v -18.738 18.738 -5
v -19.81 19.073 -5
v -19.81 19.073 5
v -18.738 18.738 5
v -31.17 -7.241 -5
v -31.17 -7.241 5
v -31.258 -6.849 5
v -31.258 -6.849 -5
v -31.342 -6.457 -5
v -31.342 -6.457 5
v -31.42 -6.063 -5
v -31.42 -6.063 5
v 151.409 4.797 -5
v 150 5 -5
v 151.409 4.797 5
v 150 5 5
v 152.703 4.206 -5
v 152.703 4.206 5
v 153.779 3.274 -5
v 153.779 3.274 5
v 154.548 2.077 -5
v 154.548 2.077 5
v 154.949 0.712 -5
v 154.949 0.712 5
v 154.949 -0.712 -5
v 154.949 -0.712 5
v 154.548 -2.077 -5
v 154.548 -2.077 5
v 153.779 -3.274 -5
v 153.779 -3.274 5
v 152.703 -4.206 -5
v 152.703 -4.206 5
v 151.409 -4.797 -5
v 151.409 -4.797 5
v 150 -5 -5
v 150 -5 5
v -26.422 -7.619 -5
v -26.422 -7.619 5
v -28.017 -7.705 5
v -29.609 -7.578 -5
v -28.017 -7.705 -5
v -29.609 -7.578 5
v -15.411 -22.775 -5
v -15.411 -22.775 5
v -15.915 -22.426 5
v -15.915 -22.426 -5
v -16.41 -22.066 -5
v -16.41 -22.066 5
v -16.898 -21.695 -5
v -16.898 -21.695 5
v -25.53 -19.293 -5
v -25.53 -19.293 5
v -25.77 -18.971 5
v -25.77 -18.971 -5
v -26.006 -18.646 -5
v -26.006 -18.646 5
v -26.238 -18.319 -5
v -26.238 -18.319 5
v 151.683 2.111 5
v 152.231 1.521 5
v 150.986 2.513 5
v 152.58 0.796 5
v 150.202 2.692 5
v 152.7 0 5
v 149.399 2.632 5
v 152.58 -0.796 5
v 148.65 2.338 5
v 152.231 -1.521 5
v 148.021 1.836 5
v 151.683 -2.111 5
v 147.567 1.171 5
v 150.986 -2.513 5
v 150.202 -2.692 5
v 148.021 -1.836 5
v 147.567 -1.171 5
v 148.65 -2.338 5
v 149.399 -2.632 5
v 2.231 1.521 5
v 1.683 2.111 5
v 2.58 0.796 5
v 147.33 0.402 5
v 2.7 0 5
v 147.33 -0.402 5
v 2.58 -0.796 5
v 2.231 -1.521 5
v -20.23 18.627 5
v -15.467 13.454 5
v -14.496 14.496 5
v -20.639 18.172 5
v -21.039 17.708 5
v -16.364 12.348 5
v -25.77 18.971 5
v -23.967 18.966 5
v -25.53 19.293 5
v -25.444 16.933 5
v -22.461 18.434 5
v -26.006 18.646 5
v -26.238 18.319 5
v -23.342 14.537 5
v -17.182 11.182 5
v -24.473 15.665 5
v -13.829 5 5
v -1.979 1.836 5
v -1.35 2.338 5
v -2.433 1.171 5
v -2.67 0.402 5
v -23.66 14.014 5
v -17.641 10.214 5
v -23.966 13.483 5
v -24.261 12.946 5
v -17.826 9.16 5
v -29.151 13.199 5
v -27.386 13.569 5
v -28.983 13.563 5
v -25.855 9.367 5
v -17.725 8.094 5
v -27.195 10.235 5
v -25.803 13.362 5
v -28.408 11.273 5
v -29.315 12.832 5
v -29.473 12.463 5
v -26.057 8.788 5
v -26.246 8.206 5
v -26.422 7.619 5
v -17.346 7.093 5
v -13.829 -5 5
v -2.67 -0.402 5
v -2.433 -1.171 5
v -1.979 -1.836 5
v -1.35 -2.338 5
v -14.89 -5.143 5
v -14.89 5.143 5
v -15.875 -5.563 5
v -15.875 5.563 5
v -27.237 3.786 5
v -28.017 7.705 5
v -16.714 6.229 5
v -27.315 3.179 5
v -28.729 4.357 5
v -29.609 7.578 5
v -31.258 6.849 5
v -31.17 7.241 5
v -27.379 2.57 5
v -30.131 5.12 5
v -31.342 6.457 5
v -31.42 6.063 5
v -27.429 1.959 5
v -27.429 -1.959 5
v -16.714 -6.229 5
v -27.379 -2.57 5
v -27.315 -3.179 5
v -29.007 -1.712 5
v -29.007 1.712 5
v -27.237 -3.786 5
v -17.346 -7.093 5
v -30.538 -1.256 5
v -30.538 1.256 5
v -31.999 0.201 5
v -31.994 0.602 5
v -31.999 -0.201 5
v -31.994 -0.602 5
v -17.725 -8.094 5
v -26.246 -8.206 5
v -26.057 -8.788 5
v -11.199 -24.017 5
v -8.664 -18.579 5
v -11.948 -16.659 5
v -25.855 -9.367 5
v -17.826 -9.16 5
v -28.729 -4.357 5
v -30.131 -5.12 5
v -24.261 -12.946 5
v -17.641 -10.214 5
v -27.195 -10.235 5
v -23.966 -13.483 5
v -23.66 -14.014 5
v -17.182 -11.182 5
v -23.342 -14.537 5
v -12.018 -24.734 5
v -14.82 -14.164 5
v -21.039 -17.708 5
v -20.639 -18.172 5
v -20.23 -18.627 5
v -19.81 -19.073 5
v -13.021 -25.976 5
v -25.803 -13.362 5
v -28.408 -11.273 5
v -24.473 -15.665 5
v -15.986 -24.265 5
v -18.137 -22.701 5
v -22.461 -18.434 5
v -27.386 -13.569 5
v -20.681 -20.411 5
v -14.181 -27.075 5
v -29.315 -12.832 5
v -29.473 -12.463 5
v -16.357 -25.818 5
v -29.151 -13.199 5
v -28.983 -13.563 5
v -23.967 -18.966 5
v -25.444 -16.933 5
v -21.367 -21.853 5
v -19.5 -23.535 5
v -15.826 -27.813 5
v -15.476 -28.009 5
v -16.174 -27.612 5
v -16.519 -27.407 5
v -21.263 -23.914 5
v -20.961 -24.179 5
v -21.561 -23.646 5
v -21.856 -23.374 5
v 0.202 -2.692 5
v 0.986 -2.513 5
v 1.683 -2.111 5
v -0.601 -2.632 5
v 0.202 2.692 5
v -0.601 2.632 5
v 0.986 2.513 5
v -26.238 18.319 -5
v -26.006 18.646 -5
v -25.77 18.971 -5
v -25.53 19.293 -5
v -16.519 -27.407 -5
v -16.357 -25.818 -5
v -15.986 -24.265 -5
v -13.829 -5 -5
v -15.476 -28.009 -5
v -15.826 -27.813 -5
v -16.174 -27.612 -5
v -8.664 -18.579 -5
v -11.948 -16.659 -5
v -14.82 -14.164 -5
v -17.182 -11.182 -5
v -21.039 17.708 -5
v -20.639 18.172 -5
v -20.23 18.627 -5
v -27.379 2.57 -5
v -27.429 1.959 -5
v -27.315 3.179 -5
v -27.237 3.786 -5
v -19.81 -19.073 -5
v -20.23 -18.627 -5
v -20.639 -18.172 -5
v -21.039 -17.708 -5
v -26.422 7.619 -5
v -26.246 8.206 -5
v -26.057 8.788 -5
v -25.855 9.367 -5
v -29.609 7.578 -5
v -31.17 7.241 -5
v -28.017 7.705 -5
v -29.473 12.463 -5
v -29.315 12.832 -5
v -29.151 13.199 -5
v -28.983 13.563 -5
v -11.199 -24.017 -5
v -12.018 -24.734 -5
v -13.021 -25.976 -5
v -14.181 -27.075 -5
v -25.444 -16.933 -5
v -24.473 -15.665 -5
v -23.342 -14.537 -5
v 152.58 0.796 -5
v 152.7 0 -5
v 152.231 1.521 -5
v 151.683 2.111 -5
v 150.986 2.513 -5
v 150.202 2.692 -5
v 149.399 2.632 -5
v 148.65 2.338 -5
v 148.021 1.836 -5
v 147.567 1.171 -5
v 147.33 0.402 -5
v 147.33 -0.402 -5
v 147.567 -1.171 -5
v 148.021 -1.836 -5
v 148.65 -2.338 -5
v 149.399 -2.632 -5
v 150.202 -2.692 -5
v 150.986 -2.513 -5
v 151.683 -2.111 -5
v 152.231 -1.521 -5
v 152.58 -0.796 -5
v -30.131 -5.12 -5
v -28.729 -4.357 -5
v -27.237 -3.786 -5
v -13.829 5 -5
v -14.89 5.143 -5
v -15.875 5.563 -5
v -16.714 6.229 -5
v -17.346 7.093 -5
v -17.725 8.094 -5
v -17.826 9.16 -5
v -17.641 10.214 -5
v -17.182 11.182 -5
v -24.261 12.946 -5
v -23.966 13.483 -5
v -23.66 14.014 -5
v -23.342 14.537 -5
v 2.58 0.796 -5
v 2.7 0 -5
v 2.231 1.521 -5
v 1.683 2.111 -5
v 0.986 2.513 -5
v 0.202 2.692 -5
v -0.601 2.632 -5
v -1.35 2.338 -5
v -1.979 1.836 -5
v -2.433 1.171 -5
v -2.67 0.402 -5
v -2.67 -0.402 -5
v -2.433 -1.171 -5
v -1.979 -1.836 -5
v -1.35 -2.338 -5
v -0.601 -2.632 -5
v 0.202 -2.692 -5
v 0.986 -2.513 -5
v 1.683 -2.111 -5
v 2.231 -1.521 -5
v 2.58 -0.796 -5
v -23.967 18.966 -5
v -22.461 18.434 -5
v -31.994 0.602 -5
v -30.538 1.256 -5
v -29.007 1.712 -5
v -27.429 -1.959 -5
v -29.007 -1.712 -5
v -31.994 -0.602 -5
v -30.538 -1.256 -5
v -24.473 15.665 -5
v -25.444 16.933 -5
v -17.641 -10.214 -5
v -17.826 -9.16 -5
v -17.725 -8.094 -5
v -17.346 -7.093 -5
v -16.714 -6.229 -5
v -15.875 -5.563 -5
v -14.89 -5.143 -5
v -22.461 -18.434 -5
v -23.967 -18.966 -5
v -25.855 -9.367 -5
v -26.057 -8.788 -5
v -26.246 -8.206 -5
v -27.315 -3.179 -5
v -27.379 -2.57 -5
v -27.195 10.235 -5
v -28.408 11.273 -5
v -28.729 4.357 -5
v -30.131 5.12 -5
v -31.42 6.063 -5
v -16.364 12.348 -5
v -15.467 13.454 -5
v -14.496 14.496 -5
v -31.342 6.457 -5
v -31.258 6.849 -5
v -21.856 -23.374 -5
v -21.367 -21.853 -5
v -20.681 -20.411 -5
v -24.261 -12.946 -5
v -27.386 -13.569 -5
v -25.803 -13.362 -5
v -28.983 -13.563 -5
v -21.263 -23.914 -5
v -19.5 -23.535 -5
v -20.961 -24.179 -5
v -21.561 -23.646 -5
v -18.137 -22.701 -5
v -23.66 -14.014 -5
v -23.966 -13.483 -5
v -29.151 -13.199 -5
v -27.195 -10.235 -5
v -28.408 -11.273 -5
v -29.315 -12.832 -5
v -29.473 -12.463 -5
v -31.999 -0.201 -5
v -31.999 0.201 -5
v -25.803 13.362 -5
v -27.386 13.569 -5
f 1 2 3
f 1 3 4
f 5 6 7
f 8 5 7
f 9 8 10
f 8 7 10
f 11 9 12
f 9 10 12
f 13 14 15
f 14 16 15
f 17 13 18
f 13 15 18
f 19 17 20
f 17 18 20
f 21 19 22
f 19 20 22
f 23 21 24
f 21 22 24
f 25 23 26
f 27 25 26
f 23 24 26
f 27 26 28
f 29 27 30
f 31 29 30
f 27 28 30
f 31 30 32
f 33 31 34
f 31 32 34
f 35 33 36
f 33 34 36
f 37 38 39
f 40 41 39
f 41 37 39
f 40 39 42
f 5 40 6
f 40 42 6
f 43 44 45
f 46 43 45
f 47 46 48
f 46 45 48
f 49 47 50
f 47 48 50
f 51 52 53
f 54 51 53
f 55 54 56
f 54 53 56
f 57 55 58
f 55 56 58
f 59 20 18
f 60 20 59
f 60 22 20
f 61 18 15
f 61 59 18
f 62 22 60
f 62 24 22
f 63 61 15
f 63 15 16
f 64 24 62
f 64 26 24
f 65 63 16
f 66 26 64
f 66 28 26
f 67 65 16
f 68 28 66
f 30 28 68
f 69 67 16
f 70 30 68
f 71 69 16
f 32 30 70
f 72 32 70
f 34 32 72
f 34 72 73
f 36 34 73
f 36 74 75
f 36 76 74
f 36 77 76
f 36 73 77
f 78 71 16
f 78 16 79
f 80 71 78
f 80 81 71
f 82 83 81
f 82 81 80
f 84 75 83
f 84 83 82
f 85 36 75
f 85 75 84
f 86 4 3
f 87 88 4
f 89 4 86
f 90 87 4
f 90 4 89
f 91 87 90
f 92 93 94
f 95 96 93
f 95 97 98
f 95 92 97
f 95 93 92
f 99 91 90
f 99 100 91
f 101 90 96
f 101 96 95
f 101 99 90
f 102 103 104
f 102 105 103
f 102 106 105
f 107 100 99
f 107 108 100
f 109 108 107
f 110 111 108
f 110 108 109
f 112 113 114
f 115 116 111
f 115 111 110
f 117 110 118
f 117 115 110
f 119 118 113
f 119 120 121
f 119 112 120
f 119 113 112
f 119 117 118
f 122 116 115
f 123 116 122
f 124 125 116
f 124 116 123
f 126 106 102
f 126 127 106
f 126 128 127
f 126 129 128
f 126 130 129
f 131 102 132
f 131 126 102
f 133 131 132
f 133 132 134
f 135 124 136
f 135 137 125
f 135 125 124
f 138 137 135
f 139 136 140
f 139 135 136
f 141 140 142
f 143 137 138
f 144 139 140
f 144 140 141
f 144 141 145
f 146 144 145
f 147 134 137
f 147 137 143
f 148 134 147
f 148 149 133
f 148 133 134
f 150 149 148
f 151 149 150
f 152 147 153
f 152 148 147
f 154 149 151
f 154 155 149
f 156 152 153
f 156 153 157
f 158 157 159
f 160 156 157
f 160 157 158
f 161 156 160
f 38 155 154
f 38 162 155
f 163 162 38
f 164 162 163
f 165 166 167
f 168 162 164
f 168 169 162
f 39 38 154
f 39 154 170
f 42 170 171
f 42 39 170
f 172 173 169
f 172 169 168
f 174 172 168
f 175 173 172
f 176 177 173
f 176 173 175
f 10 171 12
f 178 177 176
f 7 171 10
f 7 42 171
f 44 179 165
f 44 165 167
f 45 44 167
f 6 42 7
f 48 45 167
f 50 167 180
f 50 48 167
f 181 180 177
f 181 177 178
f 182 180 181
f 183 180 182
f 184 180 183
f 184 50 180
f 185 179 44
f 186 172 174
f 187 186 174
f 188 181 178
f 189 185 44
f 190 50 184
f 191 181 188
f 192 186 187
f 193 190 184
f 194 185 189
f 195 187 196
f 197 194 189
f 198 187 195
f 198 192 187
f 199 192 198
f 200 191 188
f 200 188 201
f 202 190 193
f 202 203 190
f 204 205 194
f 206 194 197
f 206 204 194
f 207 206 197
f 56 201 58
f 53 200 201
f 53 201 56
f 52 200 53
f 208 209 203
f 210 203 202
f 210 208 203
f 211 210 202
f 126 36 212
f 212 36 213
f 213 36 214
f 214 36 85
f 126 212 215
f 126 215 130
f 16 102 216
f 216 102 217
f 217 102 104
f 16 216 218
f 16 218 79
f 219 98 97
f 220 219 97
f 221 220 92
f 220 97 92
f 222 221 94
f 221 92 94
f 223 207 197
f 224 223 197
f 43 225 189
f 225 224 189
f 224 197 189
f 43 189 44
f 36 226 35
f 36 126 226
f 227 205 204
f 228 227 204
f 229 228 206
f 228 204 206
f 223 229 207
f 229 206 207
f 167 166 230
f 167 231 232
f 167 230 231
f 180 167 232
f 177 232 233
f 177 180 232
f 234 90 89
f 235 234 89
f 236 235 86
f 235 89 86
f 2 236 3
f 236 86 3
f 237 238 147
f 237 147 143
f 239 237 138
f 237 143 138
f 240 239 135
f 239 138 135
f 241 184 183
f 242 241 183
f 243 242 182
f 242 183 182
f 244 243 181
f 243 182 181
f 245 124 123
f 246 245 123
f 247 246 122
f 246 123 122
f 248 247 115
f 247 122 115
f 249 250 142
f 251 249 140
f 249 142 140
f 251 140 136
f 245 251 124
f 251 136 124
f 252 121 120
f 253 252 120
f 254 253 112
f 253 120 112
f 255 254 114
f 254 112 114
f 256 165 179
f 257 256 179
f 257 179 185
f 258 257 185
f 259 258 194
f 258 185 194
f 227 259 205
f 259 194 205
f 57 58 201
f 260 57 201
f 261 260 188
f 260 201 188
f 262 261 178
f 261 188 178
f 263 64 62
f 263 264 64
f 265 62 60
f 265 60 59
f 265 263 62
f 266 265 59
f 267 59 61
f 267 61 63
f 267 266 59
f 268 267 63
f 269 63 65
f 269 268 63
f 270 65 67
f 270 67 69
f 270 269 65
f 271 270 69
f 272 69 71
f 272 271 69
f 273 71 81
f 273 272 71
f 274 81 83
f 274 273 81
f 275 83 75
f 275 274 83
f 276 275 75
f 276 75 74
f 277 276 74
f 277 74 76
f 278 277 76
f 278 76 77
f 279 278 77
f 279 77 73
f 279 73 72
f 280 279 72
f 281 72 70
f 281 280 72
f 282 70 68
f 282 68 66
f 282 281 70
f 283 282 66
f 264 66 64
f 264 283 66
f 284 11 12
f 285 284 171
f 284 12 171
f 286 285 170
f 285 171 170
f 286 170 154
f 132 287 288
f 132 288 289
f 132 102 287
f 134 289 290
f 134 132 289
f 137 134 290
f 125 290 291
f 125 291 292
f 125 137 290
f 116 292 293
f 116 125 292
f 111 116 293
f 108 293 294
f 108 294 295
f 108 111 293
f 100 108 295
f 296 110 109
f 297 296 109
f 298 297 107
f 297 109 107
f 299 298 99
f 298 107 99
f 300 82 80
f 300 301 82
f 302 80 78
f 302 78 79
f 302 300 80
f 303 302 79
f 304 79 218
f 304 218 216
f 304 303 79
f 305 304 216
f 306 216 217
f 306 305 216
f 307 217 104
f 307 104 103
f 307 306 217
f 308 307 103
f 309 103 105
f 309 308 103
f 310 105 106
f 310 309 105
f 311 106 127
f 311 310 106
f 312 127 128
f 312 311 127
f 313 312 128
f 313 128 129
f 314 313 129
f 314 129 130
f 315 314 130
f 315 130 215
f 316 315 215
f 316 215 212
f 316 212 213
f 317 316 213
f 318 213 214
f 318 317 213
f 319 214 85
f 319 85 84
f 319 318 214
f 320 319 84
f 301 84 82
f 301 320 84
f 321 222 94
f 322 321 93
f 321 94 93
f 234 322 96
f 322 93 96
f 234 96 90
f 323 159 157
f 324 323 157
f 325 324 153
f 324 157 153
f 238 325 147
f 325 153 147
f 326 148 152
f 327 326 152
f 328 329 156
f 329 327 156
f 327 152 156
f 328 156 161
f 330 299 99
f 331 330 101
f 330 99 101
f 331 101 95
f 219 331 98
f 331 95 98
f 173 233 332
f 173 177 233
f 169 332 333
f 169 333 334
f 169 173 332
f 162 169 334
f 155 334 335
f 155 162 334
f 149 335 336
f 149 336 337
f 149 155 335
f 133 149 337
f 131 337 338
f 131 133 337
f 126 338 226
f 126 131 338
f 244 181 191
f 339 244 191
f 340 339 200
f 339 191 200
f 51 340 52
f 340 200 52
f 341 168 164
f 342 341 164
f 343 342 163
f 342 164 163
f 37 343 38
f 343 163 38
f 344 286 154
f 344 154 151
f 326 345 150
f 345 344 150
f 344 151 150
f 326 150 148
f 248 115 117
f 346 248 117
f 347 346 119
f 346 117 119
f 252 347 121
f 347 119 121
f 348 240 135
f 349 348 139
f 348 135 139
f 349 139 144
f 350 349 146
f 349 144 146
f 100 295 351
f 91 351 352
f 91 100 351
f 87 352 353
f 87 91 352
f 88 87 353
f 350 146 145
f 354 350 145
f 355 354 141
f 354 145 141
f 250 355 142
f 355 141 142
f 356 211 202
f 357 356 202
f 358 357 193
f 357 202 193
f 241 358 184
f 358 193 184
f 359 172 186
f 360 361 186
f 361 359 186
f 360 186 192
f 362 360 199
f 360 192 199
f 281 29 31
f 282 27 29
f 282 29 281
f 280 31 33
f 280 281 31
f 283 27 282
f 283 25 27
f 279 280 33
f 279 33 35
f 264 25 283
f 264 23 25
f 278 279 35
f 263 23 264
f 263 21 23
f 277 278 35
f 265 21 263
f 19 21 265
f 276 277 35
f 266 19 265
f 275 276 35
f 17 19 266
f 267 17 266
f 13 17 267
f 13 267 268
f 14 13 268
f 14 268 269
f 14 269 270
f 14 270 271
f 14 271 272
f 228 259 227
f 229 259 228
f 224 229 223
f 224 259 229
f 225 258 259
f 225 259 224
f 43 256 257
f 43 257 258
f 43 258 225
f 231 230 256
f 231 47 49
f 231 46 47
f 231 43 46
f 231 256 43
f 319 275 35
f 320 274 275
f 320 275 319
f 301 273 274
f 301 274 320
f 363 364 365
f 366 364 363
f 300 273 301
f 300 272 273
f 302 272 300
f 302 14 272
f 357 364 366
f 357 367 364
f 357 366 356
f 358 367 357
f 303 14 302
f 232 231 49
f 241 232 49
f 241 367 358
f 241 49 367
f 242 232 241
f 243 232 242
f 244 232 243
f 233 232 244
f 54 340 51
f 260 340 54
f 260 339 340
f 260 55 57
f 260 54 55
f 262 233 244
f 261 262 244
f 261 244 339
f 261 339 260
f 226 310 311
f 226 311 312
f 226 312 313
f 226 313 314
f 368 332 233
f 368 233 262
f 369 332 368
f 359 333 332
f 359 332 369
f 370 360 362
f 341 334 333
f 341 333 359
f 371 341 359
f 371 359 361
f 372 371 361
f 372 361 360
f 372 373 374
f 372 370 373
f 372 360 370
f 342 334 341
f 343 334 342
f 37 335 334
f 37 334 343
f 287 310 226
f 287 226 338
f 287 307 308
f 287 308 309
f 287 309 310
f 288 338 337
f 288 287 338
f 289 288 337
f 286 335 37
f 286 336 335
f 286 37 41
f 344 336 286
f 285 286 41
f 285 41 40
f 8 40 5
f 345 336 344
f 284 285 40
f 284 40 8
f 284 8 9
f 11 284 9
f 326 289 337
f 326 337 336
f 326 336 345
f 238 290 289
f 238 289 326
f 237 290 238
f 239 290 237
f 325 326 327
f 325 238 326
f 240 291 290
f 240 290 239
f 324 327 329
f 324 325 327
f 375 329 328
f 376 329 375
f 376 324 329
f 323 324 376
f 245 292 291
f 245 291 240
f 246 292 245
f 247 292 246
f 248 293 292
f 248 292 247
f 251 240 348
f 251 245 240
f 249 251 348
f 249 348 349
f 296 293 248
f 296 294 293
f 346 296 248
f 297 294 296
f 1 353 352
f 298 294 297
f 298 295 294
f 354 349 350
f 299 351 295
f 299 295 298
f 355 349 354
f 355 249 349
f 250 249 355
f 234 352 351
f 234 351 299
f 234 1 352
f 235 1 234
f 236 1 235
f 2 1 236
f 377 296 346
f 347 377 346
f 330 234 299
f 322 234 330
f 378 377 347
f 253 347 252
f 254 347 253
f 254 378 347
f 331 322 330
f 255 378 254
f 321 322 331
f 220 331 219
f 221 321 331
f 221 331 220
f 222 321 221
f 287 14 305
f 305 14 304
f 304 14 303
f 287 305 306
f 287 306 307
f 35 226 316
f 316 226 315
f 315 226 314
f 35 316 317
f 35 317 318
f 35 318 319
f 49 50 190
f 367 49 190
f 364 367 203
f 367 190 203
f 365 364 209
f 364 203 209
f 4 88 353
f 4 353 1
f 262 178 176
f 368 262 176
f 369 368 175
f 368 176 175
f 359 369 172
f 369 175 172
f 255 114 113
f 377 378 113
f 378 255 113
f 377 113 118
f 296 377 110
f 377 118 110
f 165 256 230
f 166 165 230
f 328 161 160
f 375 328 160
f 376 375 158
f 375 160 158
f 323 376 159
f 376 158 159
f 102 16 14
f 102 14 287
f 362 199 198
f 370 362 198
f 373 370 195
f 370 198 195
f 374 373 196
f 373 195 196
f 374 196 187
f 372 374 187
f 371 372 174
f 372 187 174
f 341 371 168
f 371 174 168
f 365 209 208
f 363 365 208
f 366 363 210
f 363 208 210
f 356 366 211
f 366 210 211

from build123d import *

# Parameters (mm, degrees)
SKETCH1_R                       = 2.7
BOSS_EXTRUDE1_DEPTH             = 5
BOSS_EXTRUDE2_REACH             = 157.161
BOSS_EXTRUDE2_DIRECTION_2_REACH = 157.161
FILLET1_R                       = 4
BOSS_EXTRUDE3_REACH             = 158.929
BOSS_EXTRUDE3_DIRECTION_2_REACH = 158.929


with BuildPart() as part:
    # Sketch1 → Boss-Extrude1 (new, symmetric)
    with BuildSketch(Plane.XY):
        with BuildLine():
            Line((0, 5), (150, 5))
            ThreePointArc((150, 5), (155, 0), (150, -5))
            Line((150, -5), (0, -5))
            ThreePointArc((0, -5), (-5, 0), (0, 5))
        make_face()
        Circle(SKETCH1_R, mode=Mode.SUBTRACT)
        with Locations((150, 0)):
            Circle(SKETCH1_R, mode=Mode.SUBTRACT)
    extrude(amount=BOSS_EXTRUDE1_DEPTH, both=True)

    # Boss-Extrude2: up to this face of the body (flat: up to its plane)
    boss_extrude2_end = Plane(part.part.faces().sort_by_distance((75, 0, 5))[0])
    # Sketch2 → Boss-Extrude2 (add, up to the picked face)
    with BuildSketch(Plane.XY, mode=Mode.PRIVATE) as boss_extrude2_sk1:
        with BuildLine():
            Line((0, 5), (-19.880895352, 5))
            ThreePointArc((-19.880895352, 5), (-17.831977334, 10.112891988), (-14.495689014, 14.495689014))
            Line((-14.495689014, 14.495689014), (-18.738329701, 18.738329701))
            ThreePointArc((-18.738329701, 18.738329701), (-26.097405455, -4.601676708), (-11.199383936, -24.017156356))
            Line((-11.199383936, -24.017156356), (-8.663674366, -18.579309634))
            ThreePointArc((-8.663674366, -18.579309634), (-15.804984265, -13.055744803), (-19.880895352, -5))
            Line((-19.880895352, -5), (0, -5))
            ThreePointArc((0, -5), (-5, 0), (0, 5))
        make_face()
    boss_extrude2_tool1 = split(extrude(boss_extrude2_sk1.sketch, amount=BOSS_EXTRUDE2_REACH, mode=Mode.PRIVATE), bisect_by=boss_extrude2_end, keep=Keep.BOTH, mode=Mode.PRIVATE)
    add(boss_extrude2_tool1.solids().sort_by(Axis((-16.92377, -2.181901, 0), (0, 0, 1)))[0])

    # Boss-Extrude2 direction 2: up to this face of the body (flat: up to its plane)
    boss_extrude2_direction_2_end = Plane(part.part.faces().sort_by_distance((75, 0, -5))[0])
    # Sketch2 → Boss-Extrude2 direction 2 (add, up to the picked face)
    with BuildSketch(Plane.XY, mode=Mode.PRIVATE) as boss_extrude2_direction_2_sk1:
        with BuildLine():
            Line((0, 5), (-19.880895352, 5))
            ThreePointArc((-19.880895352, 5), (-17.831977334, 10.112891988), (-14.495689014, 14.495689014))
            Line((-14.495689014, 14.495689014), (-18.738329701, 18.738329701))
            ThreePointArc((-18.738329701, 18.738329701), (-26.097405455, -4.601676708), (-11.199383936, -24.017156356))
            Line((-11.199383936, -24.017156356), (-8.663674366, -18.579309634))
            ThreePointArc((-8.663674366, -18.579309634), (-15.804984265, -13.055744803), (-19.880895352, -5))
            Line((-19.880895352, -5), (0, -5))
            ThreePointArc((0, -5), (-5, 0), (0, 5))
        make_face()
    boss_extrude2_direction_2_tool1 = split(extrude(boss_extrude2_direction_2_sk1.sketch, amount=-BOSS_EXTRUDE2_DIRECTION_2_REACH, mode=Mode.PRIVATE), bisect_by=boss_extrude2_direction_2_end, keep=Keep.BOTH, mode=Mode.PRIVATE)
    add(boss_extrude2_direction_2_tool1.solids().sort_by(Axis((-16.92377, -2.181901, 0), (0, 0, -1)))[0])

    # Fillet1
    fillet1_edges = [part.edges().sort_by_distance(p)[0] for p in [
        (-19.880895352, 5, 0),
        (-19.880895352, -5, 0),
    ]]
    fillet(fillet1_edges, radius=FILLET1_R)

    # Boss-Extrude3: up to this face of the body (flat: up to its plane)
    boss_extrude3_end = Plane(part.part.faces().sort_by_distance((54.007217668, -0.477206408, 5))[0])
    # Sketch3 → Boss-Extrude3 (add, up to the picked face)
    with BuildSketch(Plane.XY, mode=Mode.PRIVATE) as boss_extrude3_sk1:
        with BuildLine():
            Line((-19.809704653, 19.072771234), (-18.738329701, 18.738329701))
            ThreePointArc((-18.738329701, 18.738329701), (-26.097405455, -4.601676708), (-11.199383936, -24.017156356))
            Line((-11.199383936, -24.017156356), (-12.017747974, -24.733959138))
            ThreePointArc((-12.017747974, -24.733959138), (-13.582620769, -26.544741188), (-15.475712613, -28.008968548))
            ThreePointArc((-15.475712613, -28.008968548), (-16, -27.712812921), (-16.518621989, -27.406844539))
            ThreePointArc((-16.518621989, -27.406844539), (-16.197109821, -25.035265229), (-15.411362962, -22.774654611))
            ThreePointArc((-15.411362962, -22.774654611), (-16.163506653, -22.247158328), (-16.897610612, -21.694832486))
            ThreePointArc((-16.897610612, -21.694832486), (-18.804769939, -23.140689255), (-20.960923171, -24.179323808))
            ThreePointArc((-20.960923171, -24.179323808), (-21.412179403, -23.780634415), (-21.855853854, -23.373524601))
            ThreePointArc((-21.855853854, -23.373524601), (-21.048288434, -21.120616129), (-19.809704653, -19.072771234))
            ThreePointArc((-19.809704653, -19.072771234), (-20.435739556, -18.400422544), (-21.038966583, -17.707537551))
            ThreePointArc((-21.038966583, -17.707537551), (-23.205060428, -18.725278161), (-25.530040805, -19.292926592))
            ThreePointArc((-25.530040805, -19.292926592), (-25.88854382, -18.809128073), (-26.23788003, -18.31866948))
            ThreePointArc((-26.23788003, -18.31866948), (-24.979555842, -16.282894755), (-23.342267194, -14.537316233))
            ThreePointArc((-23.342267194, -14.537316233), (-23.814832579, -13.7495), (-24.260818757, -12.946338255))
            ThreePointArc((-24.260818757, -12.946338255), (-26.591178426, -13.491482557), (-28.983373149, -13.563335907))
            ThreePointArc((-28.983373149, -13.563335907), (-29.233454645, -13.015572578), (-29.473184945, -12.4632006))
            ThreePointArc((-29.473184945, -12.4632006), (-27.819096794, -10.733532747), (-25.854660649, -9.366510754))
            ThreePointArc((-25.854660649, -9.366510754), (-26.153103142, -8.497658328), (-26.422356736, -7.619321854))
            ThreePointArc((-26.422356736, -7.619321854), (-28.815134328, -7.668044426), (-31.169993008, -7.240962359))
            ThreePointArc((-31.169993008, -7.240962359), (-31.300723223, -6.653174106), (-31.42037025, -6.063030049))
            ThreePointArc((-31.42037025, -6.063030049), (-29.442809726, -4.715063852), (-27.23708137, -3.786343811))
            ThreePointArc((-27.23708137, -3.786343811), (-27.348357601, -2.874428211), (-27.429110937, -1.959304527))
            ThreePointArc((-27.429110937, -1.959304527), (-29.77973059, -1.509475958), (-31.994334603, -0.602124009))
            ThreePointArc((-31.994334603, -0.602124009), (-32, 0), (-31.994334603, 0.602124009))
            ThreePointArc((-31.994334603, 0.602124009), (-29.77973059, 1.509475958), (-27.429110937, 1.959304527))
            ThreePointArc((-27.429110937, 1.959304527), (-27.348357601, 2.874428211), (-27.23708137, 3.786343811))
            ThreePointArc((-27.23708137, 3.786343811), (-29.442809726, 4.715063852), (-31.42037025, 6.063030049))
            ThreePointArc((-31.42037025, 6.063030049), (-31.300723223, 6.653174106), (-31.169993008, 7.240962359))
            ThreePointArc((-31.169993008, 7.240962359), (-28.815134328, 7.668044426), (-26.422356736, 7.619321854))
            ThreePointArc((-26.422356736, 7.619321854), (-26.153103142, 8.497658328), (-25.854660649, 9.366510754))
            ThreePointArc((-25.854660649, 9.366510754), (-27.819096794, 10.733532747), (-29.473184945, 12.4632006))
            ThreePointArc((-29.473184945, 12.4632006), (-29.233454645, 13.015572578), (-28.983373149, 13.563335907))
            ThreePointArc((-28.983373149, 13.563335907), (-26.591178426, 13.491482557), (-24.260818757, 12.946338255))
            ThreePointArc((-24.260818757, 12.946338255), (-23.814832579, 13.7495), (-23.342267194, 14.537316233))
            ThreePointArc((-23.342267194, 14.537316233), (-24.979555842, 16.282894755), (-26.23788003, 18.31866948))
            ThreePointArc((-26.23788003, 18.31866948), (-25.88854382, 18.809128073), (-25.530040805, 19.292926592))
            ThreePointArc((-25.530040805, 19.292926592), (-23.205060428, 18.725278161), (-21.038966583, 17.707537551))
            ThreePointArc((-21.038966583, 17.707537551), (-20.435739556, 18.400422544), (-19.809704653, 19.072771234))
        make_face()
    boss_extrude3_tool1 = split(extrude(boss_extrude3_sk1.sketch, amount=BOSS_EXTRUDE3_REACH, mode=Mode.PRIVATE), bisect_by=boss_extrude3_end, keep=Keep.BOTH, mode=Mode.PRIVATE)
    add(boss_extrude3_tool1.solids().sort_by(Axis((-23.367328, 13.491133, 0), (0, 0, 1)))[0])

    # Boss-Extrude3 direction 2: up to this face of the body (flat: up to its plane)
    boss_extrude3_direction_2_end = Plane(part.part.faces().sort_by_distance((54.007217668, -0.477206408, -5))[0])
    # Sketch3 → Boss-Extrude3 direction 2 (add, up to the picked face)
    with BuildSketch(Plane.XY, mode=Mode.PRIVATE) as boss_extrude3_direction_2_sk1:
        with BuildLine():
            Line((-19.809704653, 19.072771234), (-18.738329701, 18.738329701))
            ThreePointArc((-18.738329701, 18.738329701), (-26.097405455, -4.601676708), (-11.199383936, -24.017156356))
            Line((-11.199383936, -24.017156356), (-12.017747974, -24.733959138))
            ThreePointArc((-12.017747974, -24.733959138), (-13.582620769, -26.544741188), (-15.475712613, -28.008968548))
            ThreePointArc((-15.475712613, -28.008968548), (-16, -27.712812921), (-16.518621989, -27.406844539))
            ThreePointArc((-16.518621989, -27.406844539), (-16.197109821, -25.035265229), (-15.411362962, -22.774654611))
            ThreePointArc((-15.411362962, -22.774654611), (-16.163506653, -22.247158328), (-16.897610612, -21.694832486))
            ThreePointArc((-16.897610612, -21.694832486), (-18.804769939, -23.140689255), (-20.960923171, -24.179323808))
            ThreePointArc((-20.960923171, -24.179323808), (-21.412179403, -23.780634415), (-21.855853854, -23.373524601))
            ThreePointArc((-21.855853854, -23.373524601), (-21.048288434, -21.120616129), (-19.809704653, -19.072771234))
            ThreePointArc((-19.809704653, -19.072771234), (-20.435739556, -18.400422544), (-21.038966583, -17.707537551))
            ThreePointArc((-21.038966583, -17.707537551), (-23.205060428, -18.725278161), (-25.530040805, -19.292926592))
            ThreePointArc((-25.530040805, -19.292926592), (-25.88854382, -18.809128073), (-26.23788003, -18.31866948))
            ThreePointArc((-26.23788003, -18.31866948), (-24.979555842, -16.282894755), (-23.342267194, -14.537316233))
            ThreePointArc((-23.342267194, -14.537316233), (-23.814832579, -13.7495), (-24.260818757, -12.946338255))
            ThreePointArc((-24.260818757, -12.946338255), (-26.591178426, -13.491482557), (-28.983373149, -13.563335907))
            ThreePointArc((-28.983373149, -13.563335907), (-29.233454645, -13.015572578), (-29.473184945, -12.4632006))
            ThreePointArc((-29.473184945, -12.4632006), (-27.819096794, -10.733532747), (-25.854660649, -9.366510754))
            ThreePointArc((-25.854660649, -9.366510754), (-26.153103142, -8.497658328), (-26.422356736, -7.619321854))
            ThreePointArc((-26.422356736, -7.619321854), (-28.815134328, -7.668044426), (-31.169993008, -7.240962359))
            ThreePointArc((-31.169993008, -7.240962359), (-31.300723223, -6.653174106), (-31.42037025, -6.063030049))
            ThreePointArc((-31.42037025, -6.063030049), (-29.442809726, -4.715063852), (-27.23708137, -3.786343811))
            ThreePointArc((-27.23708137, -3.786343811), (-27.348357601, -2.874428211), (-27.429110937, -1.959304527))
            ThreePointArc((-27.429110937, -1.959304527), (-29.77973059, -1.509475958), (-31.994334603, -0.602124009))
            ThreePointArc((-31.994334603, -0.602124009), (-32, 0), (-31.994334603, 0.602124009))
            ThreePointArc((-31.994334603, 0.602124009), (-29.77973059, 1.509475958), (-27.429110937, 1.959304527))
            ThreePointArc((-27.429110937, 1.959304527), (-27.348357601, 2.874428211), (-27.23708137, 3.786343811))
            ThreePointArc((-27.23708137, 3.786343811), (-29.442809726, 4.715063852), (-31.42037025, 6.063030049))
            ThreePointArc((-31.42037025, 6.063030049), (-31.300723223, 6.653174106), (-31.169993008, 7.240962359))
            ThreePointArc((-31.169993008, 7.240962359), (-28.815134328, 7.668044426), (-26.422356736, 7.619321854))
            ThreePointArc((-26.422356736, 7.619321854), (-26.153103142, 8.497658328), (-25.854660649, 9.366510754))
            ThreePointArc((-25.854660649, 9.366510754), (-27.819096794, 10.733532747), (-29.473184945, 12.4632006))
            ThreePointArc((-29.473184945, 12.4632006), (-29.233454645, 13.015572578), (-28.983373149, 13.563335907))
            ThreePointArc((-28.983373149, 13.563335907), (-26.591178426, 13.491482557), (-24.260818757, 12.946338255))
            ThreePointArc((-24.260818757, 12.946338255), (-23.814832579, 13.7495), (-23.342267194, 14.537316233))
            ThreePointArc((-23.342267194, 14.537316233), (-24.979555842, 16.282894755), (-26.23788003, 18.31866948))
            ThreePointArc((-26.23788003, 18.31866948), (-25.88854382, 18.809128073), (-25.530040805, 19.292926592))
            ThreePointArc((-25.530040805, 19.292926592), (-23.205060428, 18.725278161), (-21.038966583, 17.707537551))
            ThreePointArc((-21.038966583, 17.707537551), (-20.435739556, 18.400422544), (-19.809704653, 19.072771234))
        make_face()
    boss_extrude3_direction_2_tool1 = split(extrude(boss_extrude3_direction_2_sk1.sketch, amount=-BOSS_EXTRUDE3_DIRECTION_2_REACH, mode=Mode.PRIVATE), bisect_by=boss_extrude3_direction_2_end, keep=Keep.BOTH, mode=Mode.PRIVATE)
    add(boss_extrude3_direction_2_tool1.solids().sort_by(Axis((-23.367328, 13.491133, 0), (0, 0, -1)))[0])


solid = part.part
